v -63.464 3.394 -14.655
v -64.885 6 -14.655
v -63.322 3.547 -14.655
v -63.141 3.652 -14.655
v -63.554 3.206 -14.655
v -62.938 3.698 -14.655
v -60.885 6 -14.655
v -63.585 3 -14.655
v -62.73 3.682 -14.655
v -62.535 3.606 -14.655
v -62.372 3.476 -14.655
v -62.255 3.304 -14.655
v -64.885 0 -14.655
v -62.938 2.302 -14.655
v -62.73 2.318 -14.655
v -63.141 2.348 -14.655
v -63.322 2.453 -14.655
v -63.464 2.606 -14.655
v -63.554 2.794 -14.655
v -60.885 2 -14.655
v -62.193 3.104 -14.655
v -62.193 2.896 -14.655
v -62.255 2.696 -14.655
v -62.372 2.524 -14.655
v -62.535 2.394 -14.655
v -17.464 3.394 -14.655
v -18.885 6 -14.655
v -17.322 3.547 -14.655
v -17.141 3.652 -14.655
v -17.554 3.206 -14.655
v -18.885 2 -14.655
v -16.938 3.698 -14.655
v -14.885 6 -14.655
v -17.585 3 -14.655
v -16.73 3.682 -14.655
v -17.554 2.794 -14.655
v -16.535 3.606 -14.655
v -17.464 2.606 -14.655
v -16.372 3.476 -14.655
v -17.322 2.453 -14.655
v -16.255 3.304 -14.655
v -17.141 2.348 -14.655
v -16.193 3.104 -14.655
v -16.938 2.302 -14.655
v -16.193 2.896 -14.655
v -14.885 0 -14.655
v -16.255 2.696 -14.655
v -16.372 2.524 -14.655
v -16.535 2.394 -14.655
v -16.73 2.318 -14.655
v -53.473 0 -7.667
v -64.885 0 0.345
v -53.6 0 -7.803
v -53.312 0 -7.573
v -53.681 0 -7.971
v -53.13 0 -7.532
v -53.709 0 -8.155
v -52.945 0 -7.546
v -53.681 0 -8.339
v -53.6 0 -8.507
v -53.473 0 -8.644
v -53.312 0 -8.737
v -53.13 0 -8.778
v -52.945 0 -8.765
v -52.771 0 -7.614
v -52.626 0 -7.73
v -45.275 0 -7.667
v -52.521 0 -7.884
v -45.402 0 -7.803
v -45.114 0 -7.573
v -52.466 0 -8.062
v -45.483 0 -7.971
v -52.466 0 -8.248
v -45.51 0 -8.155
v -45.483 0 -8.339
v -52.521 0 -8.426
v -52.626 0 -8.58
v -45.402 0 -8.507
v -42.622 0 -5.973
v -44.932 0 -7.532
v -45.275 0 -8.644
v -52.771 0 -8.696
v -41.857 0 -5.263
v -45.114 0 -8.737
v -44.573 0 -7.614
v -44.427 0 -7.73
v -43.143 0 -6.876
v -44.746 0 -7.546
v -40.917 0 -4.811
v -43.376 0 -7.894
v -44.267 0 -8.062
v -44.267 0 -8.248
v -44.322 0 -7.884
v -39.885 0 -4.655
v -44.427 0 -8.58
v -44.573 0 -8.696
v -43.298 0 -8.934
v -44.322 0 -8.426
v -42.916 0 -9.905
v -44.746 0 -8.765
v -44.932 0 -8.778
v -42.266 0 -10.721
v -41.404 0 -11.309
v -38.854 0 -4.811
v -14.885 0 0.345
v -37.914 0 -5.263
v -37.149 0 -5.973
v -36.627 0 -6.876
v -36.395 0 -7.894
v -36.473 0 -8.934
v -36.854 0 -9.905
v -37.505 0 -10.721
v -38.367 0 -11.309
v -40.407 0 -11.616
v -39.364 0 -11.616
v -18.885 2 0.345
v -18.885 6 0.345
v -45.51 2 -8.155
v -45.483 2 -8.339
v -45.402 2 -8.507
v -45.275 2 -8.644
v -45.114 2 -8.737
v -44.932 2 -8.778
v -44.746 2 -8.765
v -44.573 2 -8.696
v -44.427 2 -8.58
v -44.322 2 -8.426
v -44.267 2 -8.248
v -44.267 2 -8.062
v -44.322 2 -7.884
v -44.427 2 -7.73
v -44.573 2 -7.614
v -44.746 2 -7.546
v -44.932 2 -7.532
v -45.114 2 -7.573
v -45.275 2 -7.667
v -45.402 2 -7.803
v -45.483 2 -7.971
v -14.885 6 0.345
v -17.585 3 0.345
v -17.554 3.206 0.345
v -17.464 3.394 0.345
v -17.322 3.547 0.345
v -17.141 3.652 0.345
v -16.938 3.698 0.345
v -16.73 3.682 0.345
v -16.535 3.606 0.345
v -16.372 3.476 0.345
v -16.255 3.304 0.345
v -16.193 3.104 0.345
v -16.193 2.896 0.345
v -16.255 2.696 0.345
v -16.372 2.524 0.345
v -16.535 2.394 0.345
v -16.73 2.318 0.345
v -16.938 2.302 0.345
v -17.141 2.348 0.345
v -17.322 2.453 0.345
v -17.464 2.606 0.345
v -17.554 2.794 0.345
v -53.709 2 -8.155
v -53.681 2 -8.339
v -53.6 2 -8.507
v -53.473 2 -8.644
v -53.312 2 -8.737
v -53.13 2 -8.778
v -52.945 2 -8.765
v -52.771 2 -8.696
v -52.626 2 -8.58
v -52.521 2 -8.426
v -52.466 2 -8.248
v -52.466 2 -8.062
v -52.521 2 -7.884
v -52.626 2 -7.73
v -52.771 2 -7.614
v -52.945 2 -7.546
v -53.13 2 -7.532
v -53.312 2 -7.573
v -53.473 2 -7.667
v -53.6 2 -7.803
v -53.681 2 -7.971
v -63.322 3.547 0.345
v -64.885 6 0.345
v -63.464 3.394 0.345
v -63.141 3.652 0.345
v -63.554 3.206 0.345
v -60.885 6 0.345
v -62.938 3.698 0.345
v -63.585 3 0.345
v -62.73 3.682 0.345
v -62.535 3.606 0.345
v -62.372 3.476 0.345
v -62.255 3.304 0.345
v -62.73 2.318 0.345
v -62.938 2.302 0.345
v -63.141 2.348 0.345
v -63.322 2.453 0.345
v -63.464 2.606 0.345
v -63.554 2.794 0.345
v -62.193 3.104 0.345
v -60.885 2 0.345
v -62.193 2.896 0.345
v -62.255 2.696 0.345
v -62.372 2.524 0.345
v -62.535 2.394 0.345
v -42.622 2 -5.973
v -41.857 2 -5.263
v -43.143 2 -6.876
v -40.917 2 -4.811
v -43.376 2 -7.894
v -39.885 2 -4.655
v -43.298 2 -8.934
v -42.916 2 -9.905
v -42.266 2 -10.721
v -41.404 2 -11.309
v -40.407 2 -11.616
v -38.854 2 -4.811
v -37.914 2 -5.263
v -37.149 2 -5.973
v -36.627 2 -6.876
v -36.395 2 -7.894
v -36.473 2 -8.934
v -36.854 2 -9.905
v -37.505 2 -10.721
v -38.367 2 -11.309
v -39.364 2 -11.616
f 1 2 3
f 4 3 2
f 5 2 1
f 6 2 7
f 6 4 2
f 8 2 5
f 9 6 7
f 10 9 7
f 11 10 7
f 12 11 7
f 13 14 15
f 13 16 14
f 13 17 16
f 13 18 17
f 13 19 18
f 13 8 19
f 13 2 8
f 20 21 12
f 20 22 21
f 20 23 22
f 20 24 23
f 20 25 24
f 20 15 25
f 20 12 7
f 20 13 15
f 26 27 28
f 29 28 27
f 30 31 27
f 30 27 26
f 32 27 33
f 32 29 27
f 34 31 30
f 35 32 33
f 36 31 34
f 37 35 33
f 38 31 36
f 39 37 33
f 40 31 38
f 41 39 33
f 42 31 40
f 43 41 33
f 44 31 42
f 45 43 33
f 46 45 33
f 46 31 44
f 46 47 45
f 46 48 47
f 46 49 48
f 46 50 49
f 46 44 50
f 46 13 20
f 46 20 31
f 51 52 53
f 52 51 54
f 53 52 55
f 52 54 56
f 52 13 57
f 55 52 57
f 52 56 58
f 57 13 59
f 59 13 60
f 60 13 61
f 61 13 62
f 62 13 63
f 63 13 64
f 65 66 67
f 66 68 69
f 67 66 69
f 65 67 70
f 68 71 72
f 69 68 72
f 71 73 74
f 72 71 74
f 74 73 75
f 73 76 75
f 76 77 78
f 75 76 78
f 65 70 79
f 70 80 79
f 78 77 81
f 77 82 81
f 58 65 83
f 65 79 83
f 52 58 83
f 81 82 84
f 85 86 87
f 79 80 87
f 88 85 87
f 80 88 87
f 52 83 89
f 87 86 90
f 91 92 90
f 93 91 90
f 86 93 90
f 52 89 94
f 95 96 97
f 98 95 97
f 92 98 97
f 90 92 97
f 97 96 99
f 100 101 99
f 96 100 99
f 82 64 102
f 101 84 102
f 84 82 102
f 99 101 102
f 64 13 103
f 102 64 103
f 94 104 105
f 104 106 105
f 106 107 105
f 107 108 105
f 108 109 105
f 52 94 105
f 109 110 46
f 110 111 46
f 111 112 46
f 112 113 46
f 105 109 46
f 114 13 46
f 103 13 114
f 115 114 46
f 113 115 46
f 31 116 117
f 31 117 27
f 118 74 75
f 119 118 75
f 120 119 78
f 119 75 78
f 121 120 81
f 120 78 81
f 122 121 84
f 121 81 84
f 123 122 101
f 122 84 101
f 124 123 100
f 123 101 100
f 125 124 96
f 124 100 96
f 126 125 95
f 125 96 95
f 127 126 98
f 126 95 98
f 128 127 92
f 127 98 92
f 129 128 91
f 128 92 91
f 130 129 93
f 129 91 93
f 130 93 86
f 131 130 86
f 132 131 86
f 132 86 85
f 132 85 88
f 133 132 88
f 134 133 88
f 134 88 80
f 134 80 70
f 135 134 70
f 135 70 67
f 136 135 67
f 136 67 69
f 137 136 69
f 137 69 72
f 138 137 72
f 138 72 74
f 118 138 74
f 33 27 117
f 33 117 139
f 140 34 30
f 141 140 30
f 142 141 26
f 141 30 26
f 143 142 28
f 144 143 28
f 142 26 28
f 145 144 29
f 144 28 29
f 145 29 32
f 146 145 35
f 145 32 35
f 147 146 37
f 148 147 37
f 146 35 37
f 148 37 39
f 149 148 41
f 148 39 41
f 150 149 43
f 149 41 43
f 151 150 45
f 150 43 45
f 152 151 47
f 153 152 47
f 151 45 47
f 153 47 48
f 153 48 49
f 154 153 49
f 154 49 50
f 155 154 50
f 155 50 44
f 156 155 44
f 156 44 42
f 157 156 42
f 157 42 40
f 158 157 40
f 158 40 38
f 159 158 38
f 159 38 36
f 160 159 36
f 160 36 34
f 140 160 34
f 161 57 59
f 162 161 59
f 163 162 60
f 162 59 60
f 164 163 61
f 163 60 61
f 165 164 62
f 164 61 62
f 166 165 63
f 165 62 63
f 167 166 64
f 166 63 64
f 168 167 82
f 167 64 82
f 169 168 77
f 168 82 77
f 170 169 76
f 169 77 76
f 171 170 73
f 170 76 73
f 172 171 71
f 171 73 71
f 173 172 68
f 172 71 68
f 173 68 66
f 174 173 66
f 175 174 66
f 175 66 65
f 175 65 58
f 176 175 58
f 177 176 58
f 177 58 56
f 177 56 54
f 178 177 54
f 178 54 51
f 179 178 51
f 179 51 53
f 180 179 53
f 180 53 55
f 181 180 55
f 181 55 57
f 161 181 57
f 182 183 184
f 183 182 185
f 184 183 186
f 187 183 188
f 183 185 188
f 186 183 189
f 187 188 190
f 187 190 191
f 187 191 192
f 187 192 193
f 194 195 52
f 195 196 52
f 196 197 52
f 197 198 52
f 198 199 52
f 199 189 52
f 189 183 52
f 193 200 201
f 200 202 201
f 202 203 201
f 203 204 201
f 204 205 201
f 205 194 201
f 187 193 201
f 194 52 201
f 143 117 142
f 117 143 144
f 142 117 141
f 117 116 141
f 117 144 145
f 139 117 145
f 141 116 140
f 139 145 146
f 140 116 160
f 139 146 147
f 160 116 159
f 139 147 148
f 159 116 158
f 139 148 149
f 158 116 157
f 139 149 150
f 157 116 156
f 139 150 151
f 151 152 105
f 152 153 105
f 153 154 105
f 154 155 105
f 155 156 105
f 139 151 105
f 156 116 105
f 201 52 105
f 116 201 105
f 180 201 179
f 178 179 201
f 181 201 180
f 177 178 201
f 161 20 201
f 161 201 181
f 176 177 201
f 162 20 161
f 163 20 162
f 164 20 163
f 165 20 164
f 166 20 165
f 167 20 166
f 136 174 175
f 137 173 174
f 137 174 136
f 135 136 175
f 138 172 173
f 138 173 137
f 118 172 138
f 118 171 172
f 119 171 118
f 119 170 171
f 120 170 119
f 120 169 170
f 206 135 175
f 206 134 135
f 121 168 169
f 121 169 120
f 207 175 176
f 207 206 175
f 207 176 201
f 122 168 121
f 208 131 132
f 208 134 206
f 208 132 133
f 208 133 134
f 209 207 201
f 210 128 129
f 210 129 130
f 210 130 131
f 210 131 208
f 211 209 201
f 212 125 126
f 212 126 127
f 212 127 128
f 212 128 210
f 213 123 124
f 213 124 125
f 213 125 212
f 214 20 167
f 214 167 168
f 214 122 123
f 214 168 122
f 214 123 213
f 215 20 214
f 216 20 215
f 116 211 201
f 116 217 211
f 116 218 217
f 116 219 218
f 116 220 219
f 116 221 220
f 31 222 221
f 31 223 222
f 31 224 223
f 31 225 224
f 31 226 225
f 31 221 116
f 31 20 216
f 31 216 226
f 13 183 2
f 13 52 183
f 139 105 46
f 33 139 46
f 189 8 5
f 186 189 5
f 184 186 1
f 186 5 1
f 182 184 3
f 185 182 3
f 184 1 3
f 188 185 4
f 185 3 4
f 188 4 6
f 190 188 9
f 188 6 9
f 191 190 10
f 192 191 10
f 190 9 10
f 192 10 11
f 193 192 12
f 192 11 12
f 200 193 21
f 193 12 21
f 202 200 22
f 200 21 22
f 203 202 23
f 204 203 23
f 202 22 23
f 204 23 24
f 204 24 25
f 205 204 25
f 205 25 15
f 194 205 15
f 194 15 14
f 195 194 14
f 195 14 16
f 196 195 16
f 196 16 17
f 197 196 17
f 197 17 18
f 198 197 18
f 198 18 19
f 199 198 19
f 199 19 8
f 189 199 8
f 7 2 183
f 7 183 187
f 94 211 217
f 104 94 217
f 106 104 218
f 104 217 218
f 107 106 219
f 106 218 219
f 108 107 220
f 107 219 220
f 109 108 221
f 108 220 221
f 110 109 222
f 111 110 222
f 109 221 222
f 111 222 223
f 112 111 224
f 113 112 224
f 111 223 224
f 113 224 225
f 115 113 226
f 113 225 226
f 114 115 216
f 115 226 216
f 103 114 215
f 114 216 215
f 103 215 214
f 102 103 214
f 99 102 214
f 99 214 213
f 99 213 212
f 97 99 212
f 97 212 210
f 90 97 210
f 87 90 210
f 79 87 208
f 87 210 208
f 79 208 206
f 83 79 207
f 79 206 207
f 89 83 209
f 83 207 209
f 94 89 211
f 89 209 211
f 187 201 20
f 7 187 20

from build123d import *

# Parameters (mm, degrees)
SKETCH1_W                = 50
SKETCH1_H                = 15
BOSS_EXTRUDE1_DEPTH      = 2
SKETCH2_R                = 3.5
CUT_EXTRUDE1_DEPTH       = 2
SKETCH3_W                = 4
SKETCH3_H                = 15
BOSS_EXTRUDE2_DEPTH      = 4
SKETCH4_R                = 0.7
CUT_EXTRUDE2_DEPTH       = 67.866379361
M1_6X0_35_TAPPED_HOLE2_D = 1.25
M1_6X0_35_TAPPED_HOLE1_D = 1.25


with BuildPart() as part:
    # Sketch1 → Boss-Extrude1 (new body)
    with BuildSketch(Plane(origin=(0, 0, 0), x_dir=(1, 0, 0), z_dir=(0, 1, 0))):
        with Locations((-39.885381165, 7.155172414)):
            Rectangle(SKETCH1_W, SKETCH1_H)
    extrude(amount=BOSS_EXTRUDE1_DEPTH)

    # Sketch2 → Cut-Extrude1 (cut)
    with BuildSketch(Plane(origin=(0, 2, 0), x_dir=(1, 0, 0), z_dir=(0, 1, 0))):
        with Locations(Location((-39.885381165, 8.155172414, 0), (0, 0, 270))):
            Circle(SKETCH2_R)
    extrude(amount=-CUT_EXTRUDE1_DEPTH, mode=Mode.SUBTRACT)

    # Sketch3 → Boss-Extrude2 (add)
    with BuildSketch(Plane(origin=(0, 2, 0), x_dir=(1, 0, 0), z_dir=(0, 1, 0))):
        with Locations((-62.885381165, 7.155172414)):
            Rectangle(SKETCH3_W, SKETCH3_H)
        with Locations((-16.885381165, 7.155172414)):
            Rectangle(SKETCH3_W, SKETCH3_H)
    extrude(amount=BOSS_EXTRUDE2_DEPTH)

    # Sketch4 → Cut-Extrude2 (cut, through all)
    with BuildSketch(Plane(origin=(0, 0, -14.655172414), x_dir=(-1, 0, 0), z_dir=(0, 0, -1))):
        with Locations((62.885381165, 3)):
            Circle(SKETCH4_R)
        with Locations((16.885381165, 3)):
            Circle(SKETCH4_R)
    extrude(amount=-CUT_EXTRUDE2_DEPTH, mode=Mode.SUBTRACT)

    # M1.6x0.35 Tapped Hole2 (through all)
    with Locations(Plane(origin=(0, 2, 0), x_dir=(1, 0, 0), z_dir=(0, 1, 0))):
        with Locations((-44.885381165, 8.155172414)):
            Hole(M1_6X0_35_TAPPED_HOLE2_D / 2)

    # M1.6x0.35 Tapped Hole1 (through all)
    with Locations(Plane(origin=(0, 2, 0), x_dir=(1, 0, 0), z_dir=(0, 1, 0))):
        with Locations((-53.083792801, 8.155172414)):
            Hole(M1_6X0_35_TAPPED_HOLE1_D / 2)


solid = part.part
